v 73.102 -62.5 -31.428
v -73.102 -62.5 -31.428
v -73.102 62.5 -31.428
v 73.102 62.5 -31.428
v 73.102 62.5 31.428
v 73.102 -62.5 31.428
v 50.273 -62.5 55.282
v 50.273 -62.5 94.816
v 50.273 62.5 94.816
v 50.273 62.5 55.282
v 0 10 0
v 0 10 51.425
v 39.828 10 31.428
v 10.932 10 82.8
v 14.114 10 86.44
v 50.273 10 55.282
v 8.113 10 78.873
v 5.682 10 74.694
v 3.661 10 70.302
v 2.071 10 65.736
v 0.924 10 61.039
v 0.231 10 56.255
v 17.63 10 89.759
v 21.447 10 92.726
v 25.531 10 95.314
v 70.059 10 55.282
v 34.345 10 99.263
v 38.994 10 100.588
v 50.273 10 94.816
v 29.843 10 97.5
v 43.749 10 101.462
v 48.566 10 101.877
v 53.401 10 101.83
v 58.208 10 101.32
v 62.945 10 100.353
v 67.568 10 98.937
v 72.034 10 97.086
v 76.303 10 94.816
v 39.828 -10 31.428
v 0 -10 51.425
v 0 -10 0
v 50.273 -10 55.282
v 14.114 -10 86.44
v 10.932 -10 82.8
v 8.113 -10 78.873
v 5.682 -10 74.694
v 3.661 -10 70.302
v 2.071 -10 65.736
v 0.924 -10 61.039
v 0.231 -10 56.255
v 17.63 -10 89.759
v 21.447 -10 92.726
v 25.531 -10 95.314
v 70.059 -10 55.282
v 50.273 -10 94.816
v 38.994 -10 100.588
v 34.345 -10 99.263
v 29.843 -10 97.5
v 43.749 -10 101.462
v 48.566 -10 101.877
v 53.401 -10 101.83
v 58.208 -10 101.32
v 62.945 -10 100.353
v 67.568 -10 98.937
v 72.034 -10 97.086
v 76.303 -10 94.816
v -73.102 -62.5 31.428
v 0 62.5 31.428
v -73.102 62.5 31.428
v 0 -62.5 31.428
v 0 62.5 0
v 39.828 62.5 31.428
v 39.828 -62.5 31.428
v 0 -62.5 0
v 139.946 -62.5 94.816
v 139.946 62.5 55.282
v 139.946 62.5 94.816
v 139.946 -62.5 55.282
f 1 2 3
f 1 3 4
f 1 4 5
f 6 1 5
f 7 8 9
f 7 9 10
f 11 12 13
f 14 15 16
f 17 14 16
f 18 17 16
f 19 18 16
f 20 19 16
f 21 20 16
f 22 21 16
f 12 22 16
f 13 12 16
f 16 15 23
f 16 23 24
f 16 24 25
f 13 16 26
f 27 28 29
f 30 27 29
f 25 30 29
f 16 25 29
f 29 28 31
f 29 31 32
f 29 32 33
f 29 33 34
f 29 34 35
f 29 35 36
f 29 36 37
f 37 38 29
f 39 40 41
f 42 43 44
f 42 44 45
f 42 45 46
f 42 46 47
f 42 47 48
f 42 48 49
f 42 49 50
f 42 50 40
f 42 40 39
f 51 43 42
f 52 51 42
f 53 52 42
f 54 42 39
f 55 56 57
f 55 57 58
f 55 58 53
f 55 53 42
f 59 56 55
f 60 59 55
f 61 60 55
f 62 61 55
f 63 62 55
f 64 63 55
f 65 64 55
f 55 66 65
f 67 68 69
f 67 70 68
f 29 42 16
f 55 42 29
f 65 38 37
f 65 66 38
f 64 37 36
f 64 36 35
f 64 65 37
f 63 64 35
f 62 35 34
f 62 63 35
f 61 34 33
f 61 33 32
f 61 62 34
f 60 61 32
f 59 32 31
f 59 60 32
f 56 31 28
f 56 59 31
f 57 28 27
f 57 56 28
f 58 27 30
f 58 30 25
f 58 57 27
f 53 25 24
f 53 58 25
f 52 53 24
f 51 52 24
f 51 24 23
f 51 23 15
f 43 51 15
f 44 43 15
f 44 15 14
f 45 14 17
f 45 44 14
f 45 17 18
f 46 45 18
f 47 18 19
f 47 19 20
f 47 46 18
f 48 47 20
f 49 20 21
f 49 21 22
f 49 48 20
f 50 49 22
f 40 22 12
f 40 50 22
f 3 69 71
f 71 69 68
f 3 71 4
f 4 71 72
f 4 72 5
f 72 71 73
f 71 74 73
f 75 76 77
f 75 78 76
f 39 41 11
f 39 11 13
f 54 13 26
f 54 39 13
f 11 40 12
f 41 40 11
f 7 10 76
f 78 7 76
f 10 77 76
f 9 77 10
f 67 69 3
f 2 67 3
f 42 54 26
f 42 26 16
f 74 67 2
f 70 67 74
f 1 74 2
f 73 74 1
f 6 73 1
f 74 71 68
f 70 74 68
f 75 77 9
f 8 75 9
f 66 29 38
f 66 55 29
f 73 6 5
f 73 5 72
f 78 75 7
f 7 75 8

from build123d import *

# Parameters (mm, degrees)
F1_DEPTH = 62.5
F2_DEPTH = 10


with BuildPart() as f1:
    # F0 (on Front) → F1 (new body, symmetric)
    with BuildSketch(Plane.XZ):
        with BuildLine():
            Line((0, 31.4277224243), (-73.1017515063, 31.4277224243))
            Line((-73.1017515063, 31.4277224243), (-73.1017515063, -31.4277224243))
            Line((-73.1017515063, -31.4277224243), (73.1017515063, -31.4277224243))
            Line((73.1017515063, -31.4277224243), (73.1017515063, 31.4277224243))
            Line((73.1017515063, 31.4277224243), (39.8282436226, 31.4277224243))
            add(Edge.make_bspline(
                [(0, 0), (13.2760812075, 10.4759074748), (26.552162415, 20.9518149495), (39.8282436226, 31.4277224243)],
                knots=[0, 0, 0, 0, 50.7345121868, 50.7345121868, 50.7345121868, 50.7345121868], degree=3))
            Line((0, 0), (0, 31.4277224243))
        make_face()
    extrude(amount=F1_DEPTH, both=True)


with BuildPart() as f1b:
    # F0 (on Front) → F1, piece 2 (new body, symmetric)
    with BuildSketch(Plane.XZ):
        with BuildLine():
            add(Edge.make_bspline(
                [(70.0591673961, 55.2823791846), (78.4092683269, 61.8712877179), (86.7593692578, 68.4601962511), (95.1094701886, 75.0491047844)],
                knots=[89.2436461858, 89.2436461858, 89.2436461858, 89.2436461858, 121.1535366735, 121.1535366735, 121.1535366735, 121.1535366735], degree=3))
            Line((70.0591673961, 55.2823791846), (139.946192503, 55.2823791846))
            Line((139.946192503, 55.2823791846), (139.946192503, 94.8158303842))
            Line((139.946192503, 94.8158303842), (76.3028285899, 94.8158303842))
            ThreePointArc((76.3028285899, 94.8158303842), (87.066689677, 86.2269254571), (95.1094701886, 75.0491047844))
        make_face()
        with BuildLine():
            Line((50.2727478743, 55.2823791846), (70.0591673961, 55.2823791846))
            add(Edge.make_bspline(
                [(70.0591673961, 55.2823791846), (78.4092683269, 61.8712877179), (86.7593692578, 68.4601962511), (95.1094701886, 75.0491047844)],
                knots=[89.2436461858, 89.2436461858, 89.2436461858, 89.2436461858, 121.1535366735, 121.1535366735, 121.1535366735, 121.1535366735], degree=3))
            ThreePointArc((95.1094701886, 75.0491047844), (87.066689677, 86.2269254571), (76.3028285899, 94.8158303842))
            Line((76.3028285899, 94.8158303842), (50.2727478743, 94.8158303842))
            Line((50.2727478743, 94.8158303842), (50.2727478743, 55.2823791846))
        make_face()
    extrude(amount=F1_DEPTH, both=True)


with BuildPart() as f2:
    # F0 (on Front) → F2 (new body, symmetric)
    with BuildSketch(Plane.XZ):
        with BuildLine():
            Line((0, 51.4254594788), (0, 31.4277224243))
            Line((0, 31.4277224243), (39.8282436226, 31.4277224243))
            add(Edge.make_bspline(
                [(39.8282436226, 31.4277224243), (49.9052182137, 39.3792746777), (59.9821928049, 47.3308269312), (70.0591673961, 55.2823791846)],
                knots=[50.7345121868, 50.7345121868, 50.7345121868, 50.7345121868, 89.2436461858, 89.2436461858, 89.2436461858, 89.2436461858], degree=3))
            Line((70.0591673961, 55.2823791846), (50.2727478743, 55.2823791846))
            Line((50.2727478743, 55.2823791846), (50.2727478743, 94.8158303842))
            Line((50.2727478743, 94.8158303842), (76.3028285899, 94.8158303842))
            ThreePointArc((76.3028285899, 94.8158303842), (25.5308911631, 95.3140853917), (0, 51.4254594788))
        make_face()
        with BuildLine():
            Line((39.8282436226, 31.4277224243), (0, 31.4277224243))
            Line((0, 31.4277224243), (0, 0))
            add(Edge.make_bspline(
                [(0, 0), (13.2760812075, 10.4759074748), (26.552162415, 20.9518149495), (39.8282436226, 31.4277224243)],
                knots=[0, 0, 0, 0, 50.7345121868, 50.7345121868, 50.7345121868, 50.7345121868], degree=3))
        make_face()
    extrude(amount=F2_DEPTH, both=True)


solid = Compound([f1.part, f1b.part, f2.part])
